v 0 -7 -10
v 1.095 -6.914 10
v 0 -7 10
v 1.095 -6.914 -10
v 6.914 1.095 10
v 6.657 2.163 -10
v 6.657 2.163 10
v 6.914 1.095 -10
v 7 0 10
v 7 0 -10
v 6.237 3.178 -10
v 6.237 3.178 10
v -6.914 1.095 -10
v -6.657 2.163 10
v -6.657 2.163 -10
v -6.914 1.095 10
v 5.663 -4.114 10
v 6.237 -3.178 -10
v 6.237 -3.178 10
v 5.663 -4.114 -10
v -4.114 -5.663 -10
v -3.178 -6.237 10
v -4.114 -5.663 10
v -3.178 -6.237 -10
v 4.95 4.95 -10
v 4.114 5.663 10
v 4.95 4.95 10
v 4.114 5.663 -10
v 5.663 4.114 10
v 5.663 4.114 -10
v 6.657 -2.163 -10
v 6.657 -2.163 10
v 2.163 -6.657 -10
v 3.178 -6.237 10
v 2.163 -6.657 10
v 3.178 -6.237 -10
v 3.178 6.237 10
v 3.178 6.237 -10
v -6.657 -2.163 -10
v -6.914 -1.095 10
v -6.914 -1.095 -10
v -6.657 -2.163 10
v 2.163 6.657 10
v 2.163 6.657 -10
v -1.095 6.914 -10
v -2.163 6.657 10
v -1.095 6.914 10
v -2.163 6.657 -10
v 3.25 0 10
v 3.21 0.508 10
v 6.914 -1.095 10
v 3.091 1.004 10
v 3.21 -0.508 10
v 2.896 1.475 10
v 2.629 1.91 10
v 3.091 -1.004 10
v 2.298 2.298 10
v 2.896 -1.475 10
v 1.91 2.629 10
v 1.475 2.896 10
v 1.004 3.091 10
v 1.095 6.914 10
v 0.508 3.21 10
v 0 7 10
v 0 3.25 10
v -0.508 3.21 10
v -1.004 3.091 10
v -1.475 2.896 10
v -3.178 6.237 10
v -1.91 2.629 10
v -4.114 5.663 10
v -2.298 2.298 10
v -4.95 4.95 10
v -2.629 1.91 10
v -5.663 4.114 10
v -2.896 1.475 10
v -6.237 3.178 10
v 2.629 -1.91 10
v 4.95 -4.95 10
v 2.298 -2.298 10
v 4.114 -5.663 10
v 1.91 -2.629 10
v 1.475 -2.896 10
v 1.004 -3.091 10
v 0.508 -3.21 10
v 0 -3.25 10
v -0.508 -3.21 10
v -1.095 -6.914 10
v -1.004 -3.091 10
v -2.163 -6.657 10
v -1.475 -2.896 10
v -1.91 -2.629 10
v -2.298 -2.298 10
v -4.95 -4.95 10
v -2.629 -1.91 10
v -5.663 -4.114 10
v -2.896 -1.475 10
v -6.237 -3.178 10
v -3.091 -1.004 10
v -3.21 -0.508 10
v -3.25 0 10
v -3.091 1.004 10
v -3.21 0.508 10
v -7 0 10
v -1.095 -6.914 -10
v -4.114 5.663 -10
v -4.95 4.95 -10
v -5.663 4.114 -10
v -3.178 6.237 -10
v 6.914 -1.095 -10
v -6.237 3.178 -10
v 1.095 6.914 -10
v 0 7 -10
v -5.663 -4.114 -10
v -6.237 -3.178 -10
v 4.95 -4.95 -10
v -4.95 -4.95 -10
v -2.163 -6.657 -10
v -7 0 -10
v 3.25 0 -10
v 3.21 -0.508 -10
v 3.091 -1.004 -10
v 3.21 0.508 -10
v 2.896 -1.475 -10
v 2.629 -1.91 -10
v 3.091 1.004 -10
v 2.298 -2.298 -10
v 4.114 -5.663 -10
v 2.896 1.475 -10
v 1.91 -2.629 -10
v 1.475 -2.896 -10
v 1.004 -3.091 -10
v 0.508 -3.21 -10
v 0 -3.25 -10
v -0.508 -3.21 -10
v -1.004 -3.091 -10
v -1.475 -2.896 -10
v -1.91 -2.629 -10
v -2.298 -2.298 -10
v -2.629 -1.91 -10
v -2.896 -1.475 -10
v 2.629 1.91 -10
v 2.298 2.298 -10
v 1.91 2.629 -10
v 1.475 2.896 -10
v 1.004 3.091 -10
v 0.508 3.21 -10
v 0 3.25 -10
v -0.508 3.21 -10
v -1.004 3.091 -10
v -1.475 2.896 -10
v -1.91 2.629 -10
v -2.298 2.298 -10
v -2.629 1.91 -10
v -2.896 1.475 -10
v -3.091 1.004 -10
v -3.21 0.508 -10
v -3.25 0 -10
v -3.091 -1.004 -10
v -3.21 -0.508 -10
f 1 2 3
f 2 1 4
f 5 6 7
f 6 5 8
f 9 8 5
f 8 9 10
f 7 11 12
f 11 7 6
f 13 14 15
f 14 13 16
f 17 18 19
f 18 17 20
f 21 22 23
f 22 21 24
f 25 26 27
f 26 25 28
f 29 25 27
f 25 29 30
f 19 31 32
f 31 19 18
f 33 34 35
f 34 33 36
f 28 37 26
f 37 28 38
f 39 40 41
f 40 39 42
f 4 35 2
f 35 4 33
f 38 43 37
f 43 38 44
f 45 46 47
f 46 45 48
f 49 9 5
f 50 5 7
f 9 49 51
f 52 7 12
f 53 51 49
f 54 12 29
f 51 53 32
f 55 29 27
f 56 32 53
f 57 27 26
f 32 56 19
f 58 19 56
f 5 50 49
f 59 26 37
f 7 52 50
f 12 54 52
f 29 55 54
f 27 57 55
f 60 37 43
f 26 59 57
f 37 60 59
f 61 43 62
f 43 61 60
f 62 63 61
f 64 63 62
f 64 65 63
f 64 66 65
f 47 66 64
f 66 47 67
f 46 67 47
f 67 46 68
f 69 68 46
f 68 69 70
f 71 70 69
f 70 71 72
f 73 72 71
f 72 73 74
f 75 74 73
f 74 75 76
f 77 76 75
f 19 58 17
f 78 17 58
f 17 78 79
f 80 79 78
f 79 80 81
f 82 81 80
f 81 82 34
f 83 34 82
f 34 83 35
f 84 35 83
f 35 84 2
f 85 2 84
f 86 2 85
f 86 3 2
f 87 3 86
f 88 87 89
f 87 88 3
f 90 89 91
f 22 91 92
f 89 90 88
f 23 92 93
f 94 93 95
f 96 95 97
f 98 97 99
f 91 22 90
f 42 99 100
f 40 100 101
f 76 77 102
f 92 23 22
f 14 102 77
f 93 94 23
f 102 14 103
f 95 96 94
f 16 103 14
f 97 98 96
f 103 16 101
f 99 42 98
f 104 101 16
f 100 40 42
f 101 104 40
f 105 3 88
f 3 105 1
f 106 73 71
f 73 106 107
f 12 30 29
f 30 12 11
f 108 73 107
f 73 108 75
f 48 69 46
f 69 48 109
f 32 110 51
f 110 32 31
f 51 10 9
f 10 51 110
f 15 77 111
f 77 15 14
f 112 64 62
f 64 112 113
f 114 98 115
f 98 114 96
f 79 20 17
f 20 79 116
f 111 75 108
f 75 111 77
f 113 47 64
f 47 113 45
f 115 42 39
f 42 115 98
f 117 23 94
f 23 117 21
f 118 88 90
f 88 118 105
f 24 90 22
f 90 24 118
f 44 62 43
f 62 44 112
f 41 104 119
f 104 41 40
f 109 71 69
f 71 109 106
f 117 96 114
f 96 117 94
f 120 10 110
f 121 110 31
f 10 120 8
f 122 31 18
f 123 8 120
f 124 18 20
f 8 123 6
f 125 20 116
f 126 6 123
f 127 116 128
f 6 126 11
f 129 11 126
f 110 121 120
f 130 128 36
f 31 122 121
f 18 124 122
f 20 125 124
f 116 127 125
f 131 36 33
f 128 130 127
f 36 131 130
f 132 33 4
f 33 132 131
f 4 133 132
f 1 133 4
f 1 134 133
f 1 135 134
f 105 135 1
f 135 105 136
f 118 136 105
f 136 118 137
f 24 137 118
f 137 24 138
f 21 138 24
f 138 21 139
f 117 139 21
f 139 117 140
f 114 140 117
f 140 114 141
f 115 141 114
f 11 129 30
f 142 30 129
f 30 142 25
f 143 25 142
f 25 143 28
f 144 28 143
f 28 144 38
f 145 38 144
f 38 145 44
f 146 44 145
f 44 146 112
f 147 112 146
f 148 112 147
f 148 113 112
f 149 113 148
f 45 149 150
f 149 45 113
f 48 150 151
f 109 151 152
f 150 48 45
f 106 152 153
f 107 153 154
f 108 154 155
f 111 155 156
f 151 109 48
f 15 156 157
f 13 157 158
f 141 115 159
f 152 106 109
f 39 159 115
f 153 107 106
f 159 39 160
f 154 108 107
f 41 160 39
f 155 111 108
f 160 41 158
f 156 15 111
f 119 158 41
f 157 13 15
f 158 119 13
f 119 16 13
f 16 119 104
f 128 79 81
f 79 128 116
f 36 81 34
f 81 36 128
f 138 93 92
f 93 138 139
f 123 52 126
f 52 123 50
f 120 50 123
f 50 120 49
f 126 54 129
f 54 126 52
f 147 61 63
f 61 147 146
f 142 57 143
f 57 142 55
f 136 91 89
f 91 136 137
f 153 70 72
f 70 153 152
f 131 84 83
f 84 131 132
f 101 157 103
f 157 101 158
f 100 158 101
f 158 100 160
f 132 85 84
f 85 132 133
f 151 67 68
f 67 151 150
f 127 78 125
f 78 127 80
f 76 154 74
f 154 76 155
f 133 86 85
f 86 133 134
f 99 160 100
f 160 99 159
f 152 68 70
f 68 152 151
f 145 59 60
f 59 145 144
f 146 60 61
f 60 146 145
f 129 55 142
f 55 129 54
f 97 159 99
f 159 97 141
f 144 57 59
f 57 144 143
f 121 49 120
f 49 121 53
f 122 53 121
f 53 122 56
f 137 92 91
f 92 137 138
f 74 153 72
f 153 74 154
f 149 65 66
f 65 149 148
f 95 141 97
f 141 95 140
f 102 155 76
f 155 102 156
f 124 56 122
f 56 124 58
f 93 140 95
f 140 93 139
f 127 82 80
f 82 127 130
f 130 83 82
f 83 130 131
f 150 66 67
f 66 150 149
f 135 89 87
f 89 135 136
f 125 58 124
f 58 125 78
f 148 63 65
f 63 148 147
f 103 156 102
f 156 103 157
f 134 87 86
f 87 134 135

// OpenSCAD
$fn = 40;
difference()
{
    cylinder(d=14,h=20,center=true);
    cylinder(d=6.5,h=21,center=true);
}
